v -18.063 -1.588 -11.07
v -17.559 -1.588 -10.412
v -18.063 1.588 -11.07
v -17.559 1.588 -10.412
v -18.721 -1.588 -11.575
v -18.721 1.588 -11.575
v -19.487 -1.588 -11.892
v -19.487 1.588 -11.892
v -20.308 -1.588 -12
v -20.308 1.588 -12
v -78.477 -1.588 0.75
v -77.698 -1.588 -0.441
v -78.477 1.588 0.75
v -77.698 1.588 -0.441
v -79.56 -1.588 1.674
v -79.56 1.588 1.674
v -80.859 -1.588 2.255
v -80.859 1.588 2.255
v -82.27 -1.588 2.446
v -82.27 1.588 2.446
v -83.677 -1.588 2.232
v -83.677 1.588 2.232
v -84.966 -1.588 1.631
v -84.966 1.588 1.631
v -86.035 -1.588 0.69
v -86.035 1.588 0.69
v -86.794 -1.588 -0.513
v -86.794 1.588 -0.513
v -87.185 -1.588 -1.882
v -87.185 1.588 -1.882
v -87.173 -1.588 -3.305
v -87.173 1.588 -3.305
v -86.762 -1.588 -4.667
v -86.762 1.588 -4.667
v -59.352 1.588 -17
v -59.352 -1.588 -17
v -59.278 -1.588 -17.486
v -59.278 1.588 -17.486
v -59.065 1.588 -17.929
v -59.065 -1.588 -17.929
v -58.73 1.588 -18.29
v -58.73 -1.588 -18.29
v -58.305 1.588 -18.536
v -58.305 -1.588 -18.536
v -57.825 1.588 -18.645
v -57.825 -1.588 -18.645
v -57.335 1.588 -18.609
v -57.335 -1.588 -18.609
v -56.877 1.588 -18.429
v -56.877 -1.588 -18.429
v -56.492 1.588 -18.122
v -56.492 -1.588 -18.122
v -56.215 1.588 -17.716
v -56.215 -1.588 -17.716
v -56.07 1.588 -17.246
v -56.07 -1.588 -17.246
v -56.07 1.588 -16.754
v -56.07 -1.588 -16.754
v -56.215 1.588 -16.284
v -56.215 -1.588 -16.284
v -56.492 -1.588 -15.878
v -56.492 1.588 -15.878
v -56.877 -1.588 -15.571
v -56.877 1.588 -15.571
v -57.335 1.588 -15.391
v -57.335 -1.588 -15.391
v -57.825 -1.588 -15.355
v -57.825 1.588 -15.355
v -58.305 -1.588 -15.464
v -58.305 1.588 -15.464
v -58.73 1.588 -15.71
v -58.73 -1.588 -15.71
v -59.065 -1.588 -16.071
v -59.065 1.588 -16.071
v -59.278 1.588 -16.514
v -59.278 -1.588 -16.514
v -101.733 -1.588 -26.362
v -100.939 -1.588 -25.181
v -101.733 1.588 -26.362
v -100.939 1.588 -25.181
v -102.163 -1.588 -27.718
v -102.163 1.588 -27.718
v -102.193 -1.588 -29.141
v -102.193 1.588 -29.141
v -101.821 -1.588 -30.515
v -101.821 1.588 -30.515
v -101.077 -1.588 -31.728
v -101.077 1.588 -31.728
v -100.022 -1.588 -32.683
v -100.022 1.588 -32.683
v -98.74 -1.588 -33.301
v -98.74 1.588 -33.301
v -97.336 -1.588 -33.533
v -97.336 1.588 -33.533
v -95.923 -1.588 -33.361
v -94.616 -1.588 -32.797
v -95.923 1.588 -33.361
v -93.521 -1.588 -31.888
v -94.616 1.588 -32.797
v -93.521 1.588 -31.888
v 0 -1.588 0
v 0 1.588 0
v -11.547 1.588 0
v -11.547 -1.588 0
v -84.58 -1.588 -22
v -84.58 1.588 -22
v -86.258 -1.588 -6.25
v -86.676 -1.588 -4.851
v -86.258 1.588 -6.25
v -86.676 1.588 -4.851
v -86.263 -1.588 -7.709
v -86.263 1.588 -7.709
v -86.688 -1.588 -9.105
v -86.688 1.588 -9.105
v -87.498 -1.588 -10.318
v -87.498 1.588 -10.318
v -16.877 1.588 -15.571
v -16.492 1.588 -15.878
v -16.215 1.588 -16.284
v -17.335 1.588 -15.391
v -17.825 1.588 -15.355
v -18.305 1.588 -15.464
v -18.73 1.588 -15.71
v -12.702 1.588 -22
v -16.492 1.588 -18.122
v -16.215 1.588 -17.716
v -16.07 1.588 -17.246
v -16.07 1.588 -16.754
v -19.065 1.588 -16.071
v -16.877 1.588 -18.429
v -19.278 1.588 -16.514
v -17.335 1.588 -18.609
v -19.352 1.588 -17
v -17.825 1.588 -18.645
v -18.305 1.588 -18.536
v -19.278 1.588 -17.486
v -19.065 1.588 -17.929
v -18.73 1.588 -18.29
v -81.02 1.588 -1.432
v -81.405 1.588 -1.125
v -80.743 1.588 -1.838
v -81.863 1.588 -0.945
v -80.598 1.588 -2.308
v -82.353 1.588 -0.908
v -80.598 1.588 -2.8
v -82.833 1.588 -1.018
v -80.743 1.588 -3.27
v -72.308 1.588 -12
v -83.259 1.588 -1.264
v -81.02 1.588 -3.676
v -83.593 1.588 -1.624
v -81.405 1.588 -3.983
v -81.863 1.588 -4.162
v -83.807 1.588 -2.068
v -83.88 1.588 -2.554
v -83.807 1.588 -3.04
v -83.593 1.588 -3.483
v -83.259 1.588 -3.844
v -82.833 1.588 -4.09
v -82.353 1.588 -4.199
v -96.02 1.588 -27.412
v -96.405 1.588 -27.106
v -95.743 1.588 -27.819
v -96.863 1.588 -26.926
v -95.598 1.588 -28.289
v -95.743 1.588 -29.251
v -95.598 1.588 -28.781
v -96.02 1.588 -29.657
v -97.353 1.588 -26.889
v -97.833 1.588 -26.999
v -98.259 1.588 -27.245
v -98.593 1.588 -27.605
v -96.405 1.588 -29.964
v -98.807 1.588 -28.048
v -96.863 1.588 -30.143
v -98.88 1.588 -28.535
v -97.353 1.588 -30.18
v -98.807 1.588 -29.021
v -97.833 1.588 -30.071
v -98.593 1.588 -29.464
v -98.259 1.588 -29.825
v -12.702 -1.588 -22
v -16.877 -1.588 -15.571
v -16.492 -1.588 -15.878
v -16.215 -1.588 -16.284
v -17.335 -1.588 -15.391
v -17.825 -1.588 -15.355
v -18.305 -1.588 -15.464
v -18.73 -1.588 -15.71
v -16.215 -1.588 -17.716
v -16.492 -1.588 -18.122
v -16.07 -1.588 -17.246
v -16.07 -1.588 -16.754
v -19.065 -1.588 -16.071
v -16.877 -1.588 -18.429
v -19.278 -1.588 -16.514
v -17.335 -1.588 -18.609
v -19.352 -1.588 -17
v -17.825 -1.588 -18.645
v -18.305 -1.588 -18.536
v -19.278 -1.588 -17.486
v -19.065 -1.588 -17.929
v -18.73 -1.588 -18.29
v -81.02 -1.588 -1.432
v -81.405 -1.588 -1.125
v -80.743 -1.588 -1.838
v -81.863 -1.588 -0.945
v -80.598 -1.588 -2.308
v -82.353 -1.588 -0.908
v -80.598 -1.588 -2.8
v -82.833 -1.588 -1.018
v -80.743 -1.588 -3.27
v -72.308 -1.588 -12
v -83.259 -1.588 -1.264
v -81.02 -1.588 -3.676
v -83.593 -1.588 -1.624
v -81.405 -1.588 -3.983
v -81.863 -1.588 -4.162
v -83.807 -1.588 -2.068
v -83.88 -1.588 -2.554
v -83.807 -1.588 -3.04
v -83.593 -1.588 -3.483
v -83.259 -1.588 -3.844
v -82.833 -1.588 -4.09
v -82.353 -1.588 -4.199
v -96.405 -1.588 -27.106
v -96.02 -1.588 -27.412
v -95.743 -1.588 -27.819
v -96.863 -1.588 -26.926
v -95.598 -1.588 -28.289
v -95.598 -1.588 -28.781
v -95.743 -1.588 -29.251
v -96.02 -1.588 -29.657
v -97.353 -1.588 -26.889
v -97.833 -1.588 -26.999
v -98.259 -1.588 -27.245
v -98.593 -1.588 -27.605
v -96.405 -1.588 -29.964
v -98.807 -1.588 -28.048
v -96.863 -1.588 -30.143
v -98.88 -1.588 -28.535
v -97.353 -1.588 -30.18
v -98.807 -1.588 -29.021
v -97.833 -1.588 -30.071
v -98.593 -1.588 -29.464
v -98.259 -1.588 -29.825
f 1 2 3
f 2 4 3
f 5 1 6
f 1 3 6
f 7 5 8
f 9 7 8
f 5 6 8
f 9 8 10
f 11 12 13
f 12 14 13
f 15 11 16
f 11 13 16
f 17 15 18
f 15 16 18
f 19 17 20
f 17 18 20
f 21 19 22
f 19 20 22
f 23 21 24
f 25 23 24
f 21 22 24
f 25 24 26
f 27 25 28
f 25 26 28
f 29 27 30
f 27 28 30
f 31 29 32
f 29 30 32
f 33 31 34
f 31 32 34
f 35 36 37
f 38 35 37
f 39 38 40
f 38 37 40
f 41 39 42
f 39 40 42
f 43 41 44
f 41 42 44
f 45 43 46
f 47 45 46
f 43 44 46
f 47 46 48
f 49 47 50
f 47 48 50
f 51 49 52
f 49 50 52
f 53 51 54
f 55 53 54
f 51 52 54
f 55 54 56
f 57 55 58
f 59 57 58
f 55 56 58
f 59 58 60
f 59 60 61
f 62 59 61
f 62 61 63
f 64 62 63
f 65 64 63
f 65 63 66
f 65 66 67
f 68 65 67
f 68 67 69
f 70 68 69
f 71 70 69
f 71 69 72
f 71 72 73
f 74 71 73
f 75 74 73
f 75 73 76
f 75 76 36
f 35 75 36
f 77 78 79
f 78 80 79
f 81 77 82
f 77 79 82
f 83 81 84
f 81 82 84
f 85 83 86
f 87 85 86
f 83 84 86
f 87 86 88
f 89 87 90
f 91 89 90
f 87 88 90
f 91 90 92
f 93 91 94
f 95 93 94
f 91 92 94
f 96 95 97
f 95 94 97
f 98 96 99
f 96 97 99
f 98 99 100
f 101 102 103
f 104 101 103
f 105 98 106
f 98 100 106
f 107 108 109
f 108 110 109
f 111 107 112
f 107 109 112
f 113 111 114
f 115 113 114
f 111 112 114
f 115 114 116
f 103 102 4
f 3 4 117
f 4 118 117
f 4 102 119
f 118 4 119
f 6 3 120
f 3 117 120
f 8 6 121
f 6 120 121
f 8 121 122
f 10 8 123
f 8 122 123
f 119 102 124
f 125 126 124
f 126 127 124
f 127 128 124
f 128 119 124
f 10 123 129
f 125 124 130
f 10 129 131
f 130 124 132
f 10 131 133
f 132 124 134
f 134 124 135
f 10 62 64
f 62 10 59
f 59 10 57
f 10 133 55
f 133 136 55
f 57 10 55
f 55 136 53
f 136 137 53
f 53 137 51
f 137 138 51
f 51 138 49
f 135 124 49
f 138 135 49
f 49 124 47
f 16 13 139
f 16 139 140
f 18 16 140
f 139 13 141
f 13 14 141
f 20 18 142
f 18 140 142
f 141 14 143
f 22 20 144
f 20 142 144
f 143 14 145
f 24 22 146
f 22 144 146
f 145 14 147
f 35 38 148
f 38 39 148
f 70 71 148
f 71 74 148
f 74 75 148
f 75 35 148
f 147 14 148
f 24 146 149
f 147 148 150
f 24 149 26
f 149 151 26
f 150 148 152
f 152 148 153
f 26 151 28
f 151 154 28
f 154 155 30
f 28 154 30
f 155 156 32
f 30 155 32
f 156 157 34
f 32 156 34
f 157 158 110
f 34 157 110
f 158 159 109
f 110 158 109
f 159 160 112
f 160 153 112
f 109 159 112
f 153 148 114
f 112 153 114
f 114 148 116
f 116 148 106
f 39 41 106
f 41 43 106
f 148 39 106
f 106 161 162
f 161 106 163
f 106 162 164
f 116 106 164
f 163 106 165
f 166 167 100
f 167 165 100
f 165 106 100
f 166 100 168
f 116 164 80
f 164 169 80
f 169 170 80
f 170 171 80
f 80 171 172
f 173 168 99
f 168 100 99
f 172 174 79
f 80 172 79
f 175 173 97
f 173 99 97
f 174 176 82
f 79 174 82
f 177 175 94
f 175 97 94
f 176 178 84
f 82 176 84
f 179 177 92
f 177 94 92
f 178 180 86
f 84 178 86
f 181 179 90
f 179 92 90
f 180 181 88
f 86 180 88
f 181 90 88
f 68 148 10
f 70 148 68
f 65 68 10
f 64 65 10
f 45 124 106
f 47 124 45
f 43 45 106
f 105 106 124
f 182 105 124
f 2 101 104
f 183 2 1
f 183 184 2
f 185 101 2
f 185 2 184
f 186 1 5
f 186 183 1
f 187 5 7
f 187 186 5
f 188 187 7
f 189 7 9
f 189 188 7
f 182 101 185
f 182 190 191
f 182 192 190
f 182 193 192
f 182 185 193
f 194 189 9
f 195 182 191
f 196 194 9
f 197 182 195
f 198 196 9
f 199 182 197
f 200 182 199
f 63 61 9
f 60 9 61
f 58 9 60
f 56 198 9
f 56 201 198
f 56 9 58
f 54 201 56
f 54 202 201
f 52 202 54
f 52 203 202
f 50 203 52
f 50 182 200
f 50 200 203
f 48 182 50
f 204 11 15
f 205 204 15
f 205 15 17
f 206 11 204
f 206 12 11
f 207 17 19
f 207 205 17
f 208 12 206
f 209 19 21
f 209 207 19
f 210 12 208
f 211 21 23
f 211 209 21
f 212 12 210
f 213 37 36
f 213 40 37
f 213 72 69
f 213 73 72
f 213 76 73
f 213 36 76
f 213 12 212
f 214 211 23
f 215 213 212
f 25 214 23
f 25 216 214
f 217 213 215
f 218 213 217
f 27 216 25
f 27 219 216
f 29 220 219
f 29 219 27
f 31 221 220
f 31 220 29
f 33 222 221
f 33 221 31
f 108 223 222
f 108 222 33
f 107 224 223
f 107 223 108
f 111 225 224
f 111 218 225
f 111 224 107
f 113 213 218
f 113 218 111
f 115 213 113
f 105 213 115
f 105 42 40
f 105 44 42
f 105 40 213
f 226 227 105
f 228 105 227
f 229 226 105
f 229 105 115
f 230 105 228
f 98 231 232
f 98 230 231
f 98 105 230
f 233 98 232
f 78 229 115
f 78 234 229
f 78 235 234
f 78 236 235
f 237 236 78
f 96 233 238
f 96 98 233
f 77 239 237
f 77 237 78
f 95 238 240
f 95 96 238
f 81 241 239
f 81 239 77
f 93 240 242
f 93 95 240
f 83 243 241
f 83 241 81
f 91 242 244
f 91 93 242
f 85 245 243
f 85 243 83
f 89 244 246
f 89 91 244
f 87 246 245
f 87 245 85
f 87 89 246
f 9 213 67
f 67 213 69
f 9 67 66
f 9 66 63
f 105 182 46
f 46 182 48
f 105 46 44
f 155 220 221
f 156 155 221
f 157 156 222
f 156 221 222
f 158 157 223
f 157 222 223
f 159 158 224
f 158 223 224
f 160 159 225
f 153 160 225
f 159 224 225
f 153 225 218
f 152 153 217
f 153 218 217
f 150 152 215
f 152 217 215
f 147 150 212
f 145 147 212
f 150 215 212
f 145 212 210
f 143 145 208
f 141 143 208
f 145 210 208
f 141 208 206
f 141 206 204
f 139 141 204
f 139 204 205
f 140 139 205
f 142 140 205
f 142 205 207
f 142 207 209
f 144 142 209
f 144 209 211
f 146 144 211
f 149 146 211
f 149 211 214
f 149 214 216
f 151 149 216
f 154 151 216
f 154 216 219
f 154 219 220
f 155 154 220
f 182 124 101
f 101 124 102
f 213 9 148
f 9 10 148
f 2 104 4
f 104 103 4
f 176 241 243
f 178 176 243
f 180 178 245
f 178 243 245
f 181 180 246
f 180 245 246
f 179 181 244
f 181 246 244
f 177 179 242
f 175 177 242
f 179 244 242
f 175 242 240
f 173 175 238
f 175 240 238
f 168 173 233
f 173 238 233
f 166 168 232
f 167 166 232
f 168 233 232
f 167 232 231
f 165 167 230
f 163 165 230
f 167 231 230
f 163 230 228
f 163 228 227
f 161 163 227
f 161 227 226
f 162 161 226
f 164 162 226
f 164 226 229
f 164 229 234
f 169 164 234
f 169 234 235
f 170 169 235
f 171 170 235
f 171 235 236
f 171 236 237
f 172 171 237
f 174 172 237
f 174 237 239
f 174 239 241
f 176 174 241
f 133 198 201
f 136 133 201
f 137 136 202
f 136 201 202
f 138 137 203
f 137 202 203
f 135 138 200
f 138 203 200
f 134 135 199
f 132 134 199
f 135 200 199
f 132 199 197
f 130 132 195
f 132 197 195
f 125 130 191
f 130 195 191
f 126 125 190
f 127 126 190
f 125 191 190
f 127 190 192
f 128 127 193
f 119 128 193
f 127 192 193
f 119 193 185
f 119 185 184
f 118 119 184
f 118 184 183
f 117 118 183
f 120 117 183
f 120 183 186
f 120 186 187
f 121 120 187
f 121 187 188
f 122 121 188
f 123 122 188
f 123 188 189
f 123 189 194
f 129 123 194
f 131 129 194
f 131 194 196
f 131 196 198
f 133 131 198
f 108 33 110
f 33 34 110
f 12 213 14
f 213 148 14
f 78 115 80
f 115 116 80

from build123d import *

# Parameters (mm, degrees)
BOSS_EXTRUDE1_DEPTH   = 1.5875
M4X0_7_TAPPED_HOLE1_D = 3.3
M4X0_7_TAPPED_HOLE2_D = 3.3


with BuildPart() as part:
    # Sketch1 → Boss-Extrude1 (new body, symmetric)
    with BuildSketch(Plane(origin=(0, 0, 0), x_dir=(1, 0, 0), z_dir=(0, 1, 0))):
        with BuildLine():
            Line((0, 0), (-11.547005384, 0))
            Line((-11.547005384, 0), (-17.558665062, 10.4125))
            ThreePointArc((-17.558665062, 10.4125), (-18.720795719, 11.574630657), (-20.308295719, 12))
            Line((-20.308295719, 12), (-72.308295719, 12))
            Line((-72.308295719, 12), (-77.698457708, 0.440760311))
            ThreePointArc((-77.698457708, 0.440760311), (-84.343088233, -1.977687418), (-86.761535579, 4.666942928))
            Line((-86.761535579, 4.666942928), (-86.675516364, 4.851411729))
            ThreePointArc((-86.675516364, 4.851411729), (-86.262765717, 7.708815155), (-87.498464442, 10.318061424))
            Line((-87.498464442, 10.318061424), (-100.938587731, 25.181055478))
            ThreePointArc((-100.938587731, 25.181055478), (-100.583555179, 32.243204718), (-93.521405939, 31.888172166))
            Line((-93.521405939, 31.888172166), (-84.579852673, 22))
            Line((-84.579852673, 22), (-12.701705922, 22))
            Line((-12.701705922, 22), (0, 0))
        make_face()
    extrude(amount=BOSS_EXTRUDE1_DEPTH, both=True)

    # M4x0.7 Tapped Hole1 (through all)
    with Locations(Plane(origin=(0, 1.5875, 0), x_dir=(1, 0, 0), z_dir=(0, 1, 0))):
        with Locations((-17.701705922, 17), (-57.701705922, 17)):
            Hole(M4X0_7_TAPPED_HOLE1_D / 2)

    # M4x0.7 Tapped Hole2 (through all)
    with Locations(Plane(origin=(0, 1.5875, 0), x_dir=(1, 0, 0), z_dir=(0, 1, 0))):
        with Locations((-82.229996835, 2.553851709), (-97.229996835, 28.534613822)):
            Hole(M4X0_7_TAPPED_HOLE2_D / 2)


solid = part.part
